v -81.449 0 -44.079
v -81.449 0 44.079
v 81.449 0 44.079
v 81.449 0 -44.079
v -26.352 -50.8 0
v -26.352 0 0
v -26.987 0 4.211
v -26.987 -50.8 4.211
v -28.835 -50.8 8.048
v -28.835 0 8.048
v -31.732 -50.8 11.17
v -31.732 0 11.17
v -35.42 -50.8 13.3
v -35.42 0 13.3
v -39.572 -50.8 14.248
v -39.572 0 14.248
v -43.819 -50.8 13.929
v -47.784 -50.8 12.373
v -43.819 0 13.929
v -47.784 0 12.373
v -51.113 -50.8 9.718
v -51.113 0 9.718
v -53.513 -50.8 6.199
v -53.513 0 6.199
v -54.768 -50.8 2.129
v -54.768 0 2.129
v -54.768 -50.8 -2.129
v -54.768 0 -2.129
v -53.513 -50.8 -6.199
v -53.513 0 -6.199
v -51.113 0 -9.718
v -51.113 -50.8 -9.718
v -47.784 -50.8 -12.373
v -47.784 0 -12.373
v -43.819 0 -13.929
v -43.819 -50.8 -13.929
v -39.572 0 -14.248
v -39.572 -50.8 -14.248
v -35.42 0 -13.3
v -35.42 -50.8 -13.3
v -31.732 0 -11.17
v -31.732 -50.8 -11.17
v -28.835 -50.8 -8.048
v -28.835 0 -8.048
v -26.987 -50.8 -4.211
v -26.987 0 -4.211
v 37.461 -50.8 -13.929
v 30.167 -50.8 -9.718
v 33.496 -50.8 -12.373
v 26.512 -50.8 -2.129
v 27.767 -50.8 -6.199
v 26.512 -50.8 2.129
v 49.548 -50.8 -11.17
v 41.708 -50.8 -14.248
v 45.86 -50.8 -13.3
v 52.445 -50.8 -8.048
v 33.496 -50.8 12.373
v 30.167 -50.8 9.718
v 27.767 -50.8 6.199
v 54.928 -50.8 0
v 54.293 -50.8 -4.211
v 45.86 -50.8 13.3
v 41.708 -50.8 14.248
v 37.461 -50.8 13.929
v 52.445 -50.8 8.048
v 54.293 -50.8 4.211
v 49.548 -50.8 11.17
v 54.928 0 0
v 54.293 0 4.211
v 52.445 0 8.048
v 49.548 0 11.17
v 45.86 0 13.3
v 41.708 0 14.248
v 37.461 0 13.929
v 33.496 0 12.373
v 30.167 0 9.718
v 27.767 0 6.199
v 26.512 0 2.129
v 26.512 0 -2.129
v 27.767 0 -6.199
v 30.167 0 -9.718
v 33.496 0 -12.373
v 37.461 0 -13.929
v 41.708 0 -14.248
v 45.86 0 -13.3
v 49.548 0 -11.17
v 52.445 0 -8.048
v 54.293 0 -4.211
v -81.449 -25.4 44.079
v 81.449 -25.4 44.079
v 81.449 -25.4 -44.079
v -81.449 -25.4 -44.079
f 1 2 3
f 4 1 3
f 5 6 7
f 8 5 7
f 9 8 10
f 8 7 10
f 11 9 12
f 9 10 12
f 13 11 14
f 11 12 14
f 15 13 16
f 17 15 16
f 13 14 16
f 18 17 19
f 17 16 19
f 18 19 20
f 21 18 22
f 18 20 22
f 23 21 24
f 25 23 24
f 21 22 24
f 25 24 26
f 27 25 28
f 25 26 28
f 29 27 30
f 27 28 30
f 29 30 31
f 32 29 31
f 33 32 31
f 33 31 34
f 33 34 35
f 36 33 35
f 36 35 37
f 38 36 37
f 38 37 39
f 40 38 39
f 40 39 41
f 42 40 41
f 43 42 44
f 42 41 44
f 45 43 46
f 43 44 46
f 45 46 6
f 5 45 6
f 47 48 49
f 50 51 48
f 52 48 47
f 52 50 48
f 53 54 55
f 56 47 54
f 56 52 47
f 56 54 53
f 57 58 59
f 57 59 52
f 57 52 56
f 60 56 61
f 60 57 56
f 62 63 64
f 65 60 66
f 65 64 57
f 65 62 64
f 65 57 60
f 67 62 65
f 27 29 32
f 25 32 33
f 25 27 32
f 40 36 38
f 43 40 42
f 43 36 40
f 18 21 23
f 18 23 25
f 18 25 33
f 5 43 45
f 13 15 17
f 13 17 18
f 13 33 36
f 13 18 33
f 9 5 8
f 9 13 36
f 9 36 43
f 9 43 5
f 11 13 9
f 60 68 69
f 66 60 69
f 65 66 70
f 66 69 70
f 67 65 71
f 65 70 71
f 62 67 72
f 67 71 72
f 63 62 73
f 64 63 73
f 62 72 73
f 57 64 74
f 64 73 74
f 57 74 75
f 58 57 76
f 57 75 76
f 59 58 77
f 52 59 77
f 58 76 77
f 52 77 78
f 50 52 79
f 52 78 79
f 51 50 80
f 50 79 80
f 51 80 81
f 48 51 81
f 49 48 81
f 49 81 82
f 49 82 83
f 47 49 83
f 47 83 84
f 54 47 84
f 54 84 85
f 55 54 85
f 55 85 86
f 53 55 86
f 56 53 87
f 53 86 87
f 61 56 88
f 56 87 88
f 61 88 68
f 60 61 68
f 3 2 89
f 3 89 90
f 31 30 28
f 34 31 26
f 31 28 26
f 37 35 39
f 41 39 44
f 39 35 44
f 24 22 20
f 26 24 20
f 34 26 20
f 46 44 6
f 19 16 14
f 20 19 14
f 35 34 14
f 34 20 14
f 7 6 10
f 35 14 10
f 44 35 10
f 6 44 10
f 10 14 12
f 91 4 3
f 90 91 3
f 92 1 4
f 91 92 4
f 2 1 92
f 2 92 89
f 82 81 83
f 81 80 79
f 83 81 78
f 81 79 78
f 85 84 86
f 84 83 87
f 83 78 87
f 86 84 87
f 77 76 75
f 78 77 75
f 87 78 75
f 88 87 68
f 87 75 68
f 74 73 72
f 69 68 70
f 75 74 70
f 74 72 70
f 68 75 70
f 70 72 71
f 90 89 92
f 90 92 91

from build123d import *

# Parameters (mm, degrees)
F0_W     = 162.8978401423
F0_H     = 88.1588757038
F0_R     = 14.2875
F1_DEPTH = 25.4
F2_DEPTH = 50.8


with BuildPart() as f1:
    # F0 (on Front) → F1 (new body)
    with BuildSketch(Plane.XZ):
        Rectangle(F0_W, F0_H)
        with Locations((-40.64, 0)):
            Circle(F0_R, mode=Mode.SUBTRACT)
        with Locations((40.64, 0)):
            Circle(F0_R, mode=Mode.SUBTRACT)
        with Locations((-40.64, 0)):
            Circle(F0_R)
        with Locations((40.64, 0)):
            Circle(F0_R)
    extrude(amount=F1_DEPTH)


with BuildPart() as f2:
    # F0 (on Front) → F2 (new body)
    with BuildSketch(Plane.XZ):
        with Locations((-40.64, 0)):
            Circle(F0_R)
    extrude(amount=F2_DEPTH)


with BuildPart() as f2b:
    # F0 (on Front) → F2, piece 2 (new body)
    with BuildSketch(Plane.XZ):
        with Locations((40.64, 0)):
            Circle(F0_R)
    extrude(amount=F2_DEPTH)


solid = Compound([f1.part, f2.part, f2b.part])
